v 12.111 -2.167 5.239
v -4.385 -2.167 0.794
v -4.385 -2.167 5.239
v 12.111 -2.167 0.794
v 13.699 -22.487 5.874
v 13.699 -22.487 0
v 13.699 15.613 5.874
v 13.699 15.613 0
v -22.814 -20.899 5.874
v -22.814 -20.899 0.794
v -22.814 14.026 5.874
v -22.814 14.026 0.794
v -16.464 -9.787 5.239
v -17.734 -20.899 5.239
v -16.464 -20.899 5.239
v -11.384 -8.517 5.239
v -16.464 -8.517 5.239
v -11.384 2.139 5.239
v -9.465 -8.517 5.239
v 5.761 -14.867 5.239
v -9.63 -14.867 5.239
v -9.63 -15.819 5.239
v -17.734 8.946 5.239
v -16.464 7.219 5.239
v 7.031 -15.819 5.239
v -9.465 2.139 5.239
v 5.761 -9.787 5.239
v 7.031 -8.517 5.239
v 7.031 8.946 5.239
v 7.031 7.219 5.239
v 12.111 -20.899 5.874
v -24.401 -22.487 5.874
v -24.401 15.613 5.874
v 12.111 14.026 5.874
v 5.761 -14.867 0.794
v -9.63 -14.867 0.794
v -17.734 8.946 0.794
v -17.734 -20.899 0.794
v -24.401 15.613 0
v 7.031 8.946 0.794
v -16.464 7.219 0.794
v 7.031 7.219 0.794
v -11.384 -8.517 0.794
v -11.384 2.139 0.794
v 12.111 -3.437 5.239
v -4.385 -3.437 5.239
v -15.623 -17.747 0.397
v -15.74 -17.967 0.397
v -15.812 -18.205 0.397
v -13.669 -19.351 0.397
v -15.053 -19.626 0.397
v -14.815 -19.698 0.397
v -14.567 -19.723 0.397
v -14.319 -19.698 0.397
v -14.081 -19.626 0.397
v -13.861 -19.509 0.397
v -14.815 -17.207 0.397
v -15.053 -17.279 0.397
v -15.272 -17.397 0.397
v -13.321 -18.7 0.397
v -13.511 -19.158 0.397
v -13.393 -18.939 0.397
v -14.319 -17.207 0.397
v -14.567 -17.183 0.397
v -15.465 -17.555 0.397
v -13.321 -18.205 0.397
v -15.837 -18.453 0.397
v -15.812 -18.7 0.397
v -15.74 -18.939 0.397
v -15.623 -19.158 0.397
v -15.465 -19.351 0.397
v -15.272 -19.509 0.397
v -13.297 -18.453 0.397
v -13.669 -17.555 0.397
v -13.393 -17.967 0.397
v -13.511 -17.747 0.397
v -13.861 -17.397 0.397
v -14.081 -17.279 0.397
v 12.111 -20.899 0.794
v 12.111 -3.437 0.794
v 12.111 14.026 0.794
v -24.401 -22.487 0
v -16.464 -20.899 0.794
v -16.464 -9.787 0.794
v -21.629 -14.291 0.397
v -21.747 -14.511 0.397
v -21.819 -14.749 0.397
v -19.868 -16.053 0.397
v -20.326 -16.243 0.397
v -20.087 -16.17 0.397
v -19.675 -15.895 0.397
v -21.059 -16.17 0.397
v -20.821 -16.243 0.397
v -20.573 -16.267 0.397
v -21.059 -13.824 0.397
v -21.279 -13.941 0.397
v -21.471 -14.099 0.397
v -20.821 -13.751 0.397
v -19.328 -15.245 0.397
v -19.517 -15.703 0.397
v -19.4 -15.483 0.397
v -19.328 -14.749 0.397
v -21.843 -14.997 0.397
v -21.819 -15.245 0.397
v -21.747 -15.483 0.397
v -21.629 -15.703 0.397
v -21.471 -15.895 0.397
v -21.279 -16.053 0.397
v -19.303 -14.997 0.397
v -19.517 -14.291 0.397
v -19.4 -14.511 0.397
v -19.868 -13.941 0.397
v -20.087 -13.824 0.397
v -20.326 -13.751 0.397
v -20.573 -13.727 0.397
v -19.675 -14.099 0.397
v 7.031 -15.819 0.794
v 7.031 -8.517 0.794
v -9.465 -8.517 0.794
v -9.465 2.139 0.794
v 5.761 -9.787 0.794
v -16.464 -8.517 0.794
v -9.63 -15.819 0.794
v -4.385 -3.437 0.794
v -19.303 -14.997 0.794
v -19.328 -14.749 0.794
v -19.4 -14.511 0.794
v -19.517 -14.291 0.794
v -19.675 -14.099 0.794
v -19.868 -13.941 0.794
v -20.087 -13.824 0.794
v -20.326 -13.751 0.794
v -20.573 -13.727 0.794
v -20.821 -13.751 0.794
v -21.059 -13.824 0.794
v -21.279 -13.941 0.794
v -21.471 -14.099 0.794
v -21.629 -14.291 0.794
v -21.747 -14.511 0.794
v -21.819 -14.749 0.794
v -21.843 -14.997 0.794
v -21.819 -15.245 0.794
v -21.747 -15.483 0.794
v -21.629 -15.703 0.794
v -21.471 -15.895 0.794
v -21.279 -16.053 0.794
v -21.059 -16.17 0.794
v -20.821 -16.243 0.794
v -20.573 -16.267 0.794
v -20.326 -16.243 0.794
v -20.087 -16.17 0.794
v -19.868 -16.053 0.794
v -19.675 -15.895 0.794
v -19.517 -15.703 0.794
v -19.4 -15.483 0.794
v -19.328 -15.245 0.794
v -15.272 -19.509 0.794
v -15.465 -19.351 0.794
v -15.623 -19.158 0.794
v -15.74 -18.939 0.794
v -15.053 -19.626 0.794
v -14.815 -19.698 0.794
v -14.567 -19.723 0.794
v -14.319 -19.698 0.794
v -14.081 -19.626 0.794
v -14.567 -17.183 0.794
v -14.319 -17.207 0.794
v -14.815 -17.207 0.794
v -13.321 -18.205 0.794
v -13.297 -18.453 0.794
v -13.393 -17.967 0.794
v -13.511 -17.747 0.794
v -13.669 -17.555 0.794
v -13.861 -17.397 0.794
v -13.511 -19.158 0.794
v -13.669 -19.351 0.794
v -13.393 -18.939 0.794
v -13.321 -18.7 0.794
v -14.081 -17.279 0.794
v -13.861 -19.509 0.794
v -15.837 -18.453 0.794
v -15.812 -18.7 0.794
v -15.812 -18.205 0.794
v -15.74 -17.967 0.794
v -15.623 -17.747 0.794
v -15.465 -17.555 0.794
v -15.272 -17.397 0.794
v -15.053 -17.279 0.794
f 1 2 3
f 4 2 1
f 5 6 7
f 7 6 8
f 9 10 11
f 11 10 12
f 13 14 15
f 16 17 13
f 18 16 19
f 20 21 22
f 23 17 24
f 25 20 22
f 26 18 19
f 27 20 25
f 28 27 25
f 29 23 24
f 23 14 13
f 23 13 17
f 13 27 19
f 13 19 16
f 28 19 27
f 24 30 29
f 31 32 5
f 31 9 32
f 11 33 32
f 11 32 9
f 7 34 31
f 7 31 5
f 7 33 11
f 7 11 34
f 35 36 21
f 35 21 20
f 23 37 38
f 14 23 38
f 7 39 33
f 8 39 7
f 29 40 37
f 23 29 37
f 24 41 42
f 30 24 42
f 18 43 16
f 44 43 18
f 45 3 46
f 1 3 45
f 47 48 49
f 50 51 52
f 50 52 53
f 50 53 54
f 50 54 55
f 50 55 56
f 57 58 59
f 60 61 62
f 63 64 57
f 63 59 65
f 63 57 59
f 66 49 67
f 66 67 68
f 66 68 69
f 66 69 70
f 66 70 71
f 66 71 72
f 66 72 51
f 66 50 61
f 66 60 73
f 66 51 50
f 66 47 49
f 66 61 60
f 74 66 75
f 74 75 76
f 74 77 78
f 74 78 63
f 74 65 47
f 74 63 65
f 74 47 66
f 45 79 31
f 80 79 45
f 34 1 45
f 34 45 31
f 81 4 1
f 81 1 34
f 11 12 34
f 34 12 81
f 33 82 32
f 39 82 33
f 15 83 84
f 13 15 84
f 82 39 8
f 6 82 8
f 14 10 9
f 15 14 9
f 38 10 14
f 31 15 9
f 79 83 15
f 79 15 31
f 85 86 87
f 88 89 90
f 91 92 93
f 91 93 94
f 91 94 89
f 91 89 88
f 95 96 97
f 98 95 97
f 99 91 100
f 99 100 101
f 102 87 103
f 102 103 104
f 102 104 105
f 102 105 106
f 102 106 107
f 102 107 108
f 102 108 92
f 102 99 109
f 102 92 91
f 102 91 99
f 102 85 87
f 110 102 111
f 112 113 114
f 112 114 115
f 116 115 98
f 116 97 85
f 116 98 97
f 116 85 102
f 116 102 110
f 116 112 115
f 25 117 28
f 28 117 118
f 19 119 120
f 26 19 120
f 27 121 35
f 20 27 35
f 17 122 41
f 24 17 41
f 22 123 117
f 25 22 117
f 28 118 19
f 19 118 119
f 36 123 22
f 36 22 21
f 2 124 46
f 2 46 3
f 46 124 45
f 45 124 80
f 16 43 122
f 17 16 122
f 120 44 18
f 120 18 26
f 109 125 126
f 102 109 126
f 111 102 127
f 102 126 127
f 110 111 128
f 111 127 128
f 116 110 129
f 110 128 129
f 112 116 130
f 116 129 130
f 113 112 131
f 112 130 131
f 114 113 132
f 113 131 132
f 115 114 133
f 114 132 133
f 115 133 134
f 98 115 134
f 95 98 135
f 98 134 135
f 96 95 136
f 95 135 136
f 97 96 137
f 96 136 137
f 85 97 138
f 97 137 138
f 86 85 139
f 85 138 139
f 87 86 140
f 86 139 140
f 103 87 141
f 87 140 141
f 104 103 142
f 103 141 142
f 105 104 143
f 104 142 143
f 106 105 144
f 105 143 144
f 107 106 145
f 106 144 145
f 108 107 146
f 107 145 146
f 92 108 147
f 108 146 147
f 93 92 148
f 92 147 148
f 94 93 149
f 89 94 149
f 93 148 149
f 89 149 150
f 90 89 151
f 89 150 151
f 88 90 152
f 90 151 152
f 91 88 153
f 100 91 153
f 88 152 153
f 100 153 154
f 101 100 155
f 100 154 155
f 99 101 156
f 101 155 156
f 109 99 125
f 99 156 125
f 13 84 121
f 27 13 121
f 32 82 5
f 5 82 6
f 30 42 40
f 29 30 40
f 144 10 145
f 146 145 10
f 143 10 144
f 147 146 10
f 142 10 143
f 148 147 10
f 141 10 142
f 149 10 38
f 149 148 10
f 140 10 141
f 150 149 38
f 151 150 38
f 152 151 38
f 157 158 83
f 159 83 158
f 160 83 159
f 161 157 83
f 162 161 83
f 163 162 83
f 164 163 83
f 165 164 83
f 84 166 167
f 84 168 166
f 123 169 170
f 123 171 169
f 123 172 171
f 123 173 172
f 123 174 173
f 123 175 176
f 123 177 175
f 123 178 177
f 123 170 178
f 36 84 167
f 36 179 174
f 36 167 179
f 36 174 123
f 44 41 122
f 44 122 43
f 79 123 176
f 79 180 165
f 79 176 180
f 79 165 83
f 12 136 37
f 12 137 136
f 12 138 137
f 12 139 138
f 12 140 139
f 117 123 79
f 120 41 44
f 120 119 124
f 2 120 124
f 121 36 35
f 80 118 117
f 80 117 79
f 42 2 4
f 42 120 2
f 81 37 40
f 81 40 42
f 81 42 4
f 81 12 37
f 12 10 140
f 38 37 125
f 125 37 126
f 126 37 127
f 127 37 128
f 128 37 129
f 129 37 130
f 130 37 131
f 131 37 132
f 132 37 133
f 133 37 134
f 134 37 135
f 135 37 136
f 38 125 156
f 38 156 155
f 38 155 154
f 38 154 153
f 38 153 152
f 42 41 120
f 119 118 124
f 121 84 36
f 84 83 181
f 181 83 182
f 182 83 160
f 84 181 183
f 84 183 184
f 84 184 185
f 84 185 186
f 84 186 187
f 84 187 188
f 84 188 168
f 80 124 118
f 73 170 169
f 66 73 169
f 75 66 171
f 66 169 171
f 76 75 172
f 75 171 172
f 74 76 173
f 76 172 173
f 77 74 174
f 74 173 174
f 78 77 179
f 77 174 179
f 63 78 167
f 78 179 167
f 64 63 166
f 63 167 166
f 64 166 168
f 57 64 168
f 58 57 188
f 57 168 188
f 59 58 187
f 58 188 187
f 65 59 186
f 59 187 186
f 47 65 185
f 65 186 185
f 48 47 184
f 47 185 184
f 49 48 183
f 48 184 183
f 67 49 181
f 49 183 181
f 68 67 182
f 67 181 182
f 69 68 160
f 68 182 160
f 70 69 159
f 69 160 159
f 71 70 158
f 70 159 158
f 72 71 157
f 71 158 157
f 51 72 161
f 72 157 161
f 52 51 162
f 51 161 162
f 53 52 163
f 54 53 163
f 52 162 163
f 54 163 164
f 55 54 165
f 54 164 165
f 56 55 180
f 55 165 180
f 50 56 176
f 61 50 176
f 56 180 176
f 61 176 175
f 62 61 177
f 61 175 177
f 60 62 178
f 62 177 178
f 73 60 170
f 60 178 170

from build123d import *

# Parameters (mm, degrees)
F0_W     = 38.1
F0_H     = 38.1
F1_DEPTH = 0.79375
F2_W     = 38.1
F2_H     = 38.1
F2_W_2   = 34.925
F2_H_2   = 34.925
F3_DEPTH = 5.08
F4_W     = 23.495
F4_H     = 1.7271855524
F4_W_2   = 1.9184793842
F4_H_2   = 10.6553144476
F4_W_3   = 16.4965206158
F4_H_3   = 1.27
F4_W_4   = 15.3910815895
F4_H_4   = 0.9525
F5_DEPTH = 4.445
F4_R     = 1.27
F6_DEPTH = 0.396875


with BuildPart() as f1:
    # F0 (on Top) → F1 (new body)
    with BuildSketch(Plane.XY):
        with Locations((-5.3514037281, -3.4365521467)):
            Rectangle(F0_W, F0_H)
    extrude(amount=F1_DEPTH)

    # F2 (on face) → F3 (join)
    with BuildSketch(Plane.XY.offset(0.79375)):
        with Locations((-5.3514037281, -3.4365521467)):
            Rectangle(F2_W, F2_H)
        with Locations((-5.3514037281, -3.4365521467)):
            Rectangle(F2_W_2, F2_H_2, mode=Mode.SUBTRACT)
    extrude(amount=F3_DEPTH)

    # F4 (on face) → F5 (join)
    with BuildSketch(Plane.XY.offset(0.79375)):
        Polygon((-17.7339037281, 8.9459478533), (-17.7339037281, -20.8990521467), (-16.4639037281, -20.8990521467), (-16.4639037281, -9.7865521467), (-16.4639037281, -8.5165521467), (-16.4639037281, 7.2187623009), (-16.4639037281, 8.9459478533), align=None)
        with Locations((-4.7164037281, 8.0823550771)):
            Rectangle(F4_W, F4_H)
        with Locations((-10.424664036, -3.1888949229)):
            Rectangle(F4_W_2, F4_H_2)
        Polygon((-16.4639037281, -8.5165521467), (-16.4639037281, -9.7865521467), (-9.4654243439, -9.7865521467), (-9.4654243439, -8.5165521467), (-11.3839037281, -8.5165521467), align=None)
        Polygon((-9.4654243439, -8.5165521467), (-9.4654243439, -9.7865521467), (5.7610962719, -9.7865521467), (7.0310962719, -9.7865521467), (7.0310962719, -8.5165521467), align=None)
        with Locations((3.862835964, -2.8015521467)):
            Rectangle(F4_W_3, F4_H_3)
        Polygon((7.0310962719, -9.7865521467), (5.7610962719, -9.7865521467), (5.7610962719, -14.8665521467), (5.7610962719, -15.8190521467), (7.0310962719, -15.8190521467), align=None)
        with Locations((-1.9344445229, -15.3428021467)):
            Rectangle(F4_W_4, F4_H_4)
    extrude(amount=F5_DEPTH)

    # F4 (on face) → F6 (cut)
    with BuildSketch(Plane.XY.offset(0.79375)):
        with Locations((-20.5732807517, -14.9969505146)):
            Circle(F4_R)
        with Locations((-14.5668098703, -18.4527281672)):
            Circle(F4_R)
    extrude(amount=-F6_DEPTH, mode=Mode.SUBTRACT)


solid = f1.part
